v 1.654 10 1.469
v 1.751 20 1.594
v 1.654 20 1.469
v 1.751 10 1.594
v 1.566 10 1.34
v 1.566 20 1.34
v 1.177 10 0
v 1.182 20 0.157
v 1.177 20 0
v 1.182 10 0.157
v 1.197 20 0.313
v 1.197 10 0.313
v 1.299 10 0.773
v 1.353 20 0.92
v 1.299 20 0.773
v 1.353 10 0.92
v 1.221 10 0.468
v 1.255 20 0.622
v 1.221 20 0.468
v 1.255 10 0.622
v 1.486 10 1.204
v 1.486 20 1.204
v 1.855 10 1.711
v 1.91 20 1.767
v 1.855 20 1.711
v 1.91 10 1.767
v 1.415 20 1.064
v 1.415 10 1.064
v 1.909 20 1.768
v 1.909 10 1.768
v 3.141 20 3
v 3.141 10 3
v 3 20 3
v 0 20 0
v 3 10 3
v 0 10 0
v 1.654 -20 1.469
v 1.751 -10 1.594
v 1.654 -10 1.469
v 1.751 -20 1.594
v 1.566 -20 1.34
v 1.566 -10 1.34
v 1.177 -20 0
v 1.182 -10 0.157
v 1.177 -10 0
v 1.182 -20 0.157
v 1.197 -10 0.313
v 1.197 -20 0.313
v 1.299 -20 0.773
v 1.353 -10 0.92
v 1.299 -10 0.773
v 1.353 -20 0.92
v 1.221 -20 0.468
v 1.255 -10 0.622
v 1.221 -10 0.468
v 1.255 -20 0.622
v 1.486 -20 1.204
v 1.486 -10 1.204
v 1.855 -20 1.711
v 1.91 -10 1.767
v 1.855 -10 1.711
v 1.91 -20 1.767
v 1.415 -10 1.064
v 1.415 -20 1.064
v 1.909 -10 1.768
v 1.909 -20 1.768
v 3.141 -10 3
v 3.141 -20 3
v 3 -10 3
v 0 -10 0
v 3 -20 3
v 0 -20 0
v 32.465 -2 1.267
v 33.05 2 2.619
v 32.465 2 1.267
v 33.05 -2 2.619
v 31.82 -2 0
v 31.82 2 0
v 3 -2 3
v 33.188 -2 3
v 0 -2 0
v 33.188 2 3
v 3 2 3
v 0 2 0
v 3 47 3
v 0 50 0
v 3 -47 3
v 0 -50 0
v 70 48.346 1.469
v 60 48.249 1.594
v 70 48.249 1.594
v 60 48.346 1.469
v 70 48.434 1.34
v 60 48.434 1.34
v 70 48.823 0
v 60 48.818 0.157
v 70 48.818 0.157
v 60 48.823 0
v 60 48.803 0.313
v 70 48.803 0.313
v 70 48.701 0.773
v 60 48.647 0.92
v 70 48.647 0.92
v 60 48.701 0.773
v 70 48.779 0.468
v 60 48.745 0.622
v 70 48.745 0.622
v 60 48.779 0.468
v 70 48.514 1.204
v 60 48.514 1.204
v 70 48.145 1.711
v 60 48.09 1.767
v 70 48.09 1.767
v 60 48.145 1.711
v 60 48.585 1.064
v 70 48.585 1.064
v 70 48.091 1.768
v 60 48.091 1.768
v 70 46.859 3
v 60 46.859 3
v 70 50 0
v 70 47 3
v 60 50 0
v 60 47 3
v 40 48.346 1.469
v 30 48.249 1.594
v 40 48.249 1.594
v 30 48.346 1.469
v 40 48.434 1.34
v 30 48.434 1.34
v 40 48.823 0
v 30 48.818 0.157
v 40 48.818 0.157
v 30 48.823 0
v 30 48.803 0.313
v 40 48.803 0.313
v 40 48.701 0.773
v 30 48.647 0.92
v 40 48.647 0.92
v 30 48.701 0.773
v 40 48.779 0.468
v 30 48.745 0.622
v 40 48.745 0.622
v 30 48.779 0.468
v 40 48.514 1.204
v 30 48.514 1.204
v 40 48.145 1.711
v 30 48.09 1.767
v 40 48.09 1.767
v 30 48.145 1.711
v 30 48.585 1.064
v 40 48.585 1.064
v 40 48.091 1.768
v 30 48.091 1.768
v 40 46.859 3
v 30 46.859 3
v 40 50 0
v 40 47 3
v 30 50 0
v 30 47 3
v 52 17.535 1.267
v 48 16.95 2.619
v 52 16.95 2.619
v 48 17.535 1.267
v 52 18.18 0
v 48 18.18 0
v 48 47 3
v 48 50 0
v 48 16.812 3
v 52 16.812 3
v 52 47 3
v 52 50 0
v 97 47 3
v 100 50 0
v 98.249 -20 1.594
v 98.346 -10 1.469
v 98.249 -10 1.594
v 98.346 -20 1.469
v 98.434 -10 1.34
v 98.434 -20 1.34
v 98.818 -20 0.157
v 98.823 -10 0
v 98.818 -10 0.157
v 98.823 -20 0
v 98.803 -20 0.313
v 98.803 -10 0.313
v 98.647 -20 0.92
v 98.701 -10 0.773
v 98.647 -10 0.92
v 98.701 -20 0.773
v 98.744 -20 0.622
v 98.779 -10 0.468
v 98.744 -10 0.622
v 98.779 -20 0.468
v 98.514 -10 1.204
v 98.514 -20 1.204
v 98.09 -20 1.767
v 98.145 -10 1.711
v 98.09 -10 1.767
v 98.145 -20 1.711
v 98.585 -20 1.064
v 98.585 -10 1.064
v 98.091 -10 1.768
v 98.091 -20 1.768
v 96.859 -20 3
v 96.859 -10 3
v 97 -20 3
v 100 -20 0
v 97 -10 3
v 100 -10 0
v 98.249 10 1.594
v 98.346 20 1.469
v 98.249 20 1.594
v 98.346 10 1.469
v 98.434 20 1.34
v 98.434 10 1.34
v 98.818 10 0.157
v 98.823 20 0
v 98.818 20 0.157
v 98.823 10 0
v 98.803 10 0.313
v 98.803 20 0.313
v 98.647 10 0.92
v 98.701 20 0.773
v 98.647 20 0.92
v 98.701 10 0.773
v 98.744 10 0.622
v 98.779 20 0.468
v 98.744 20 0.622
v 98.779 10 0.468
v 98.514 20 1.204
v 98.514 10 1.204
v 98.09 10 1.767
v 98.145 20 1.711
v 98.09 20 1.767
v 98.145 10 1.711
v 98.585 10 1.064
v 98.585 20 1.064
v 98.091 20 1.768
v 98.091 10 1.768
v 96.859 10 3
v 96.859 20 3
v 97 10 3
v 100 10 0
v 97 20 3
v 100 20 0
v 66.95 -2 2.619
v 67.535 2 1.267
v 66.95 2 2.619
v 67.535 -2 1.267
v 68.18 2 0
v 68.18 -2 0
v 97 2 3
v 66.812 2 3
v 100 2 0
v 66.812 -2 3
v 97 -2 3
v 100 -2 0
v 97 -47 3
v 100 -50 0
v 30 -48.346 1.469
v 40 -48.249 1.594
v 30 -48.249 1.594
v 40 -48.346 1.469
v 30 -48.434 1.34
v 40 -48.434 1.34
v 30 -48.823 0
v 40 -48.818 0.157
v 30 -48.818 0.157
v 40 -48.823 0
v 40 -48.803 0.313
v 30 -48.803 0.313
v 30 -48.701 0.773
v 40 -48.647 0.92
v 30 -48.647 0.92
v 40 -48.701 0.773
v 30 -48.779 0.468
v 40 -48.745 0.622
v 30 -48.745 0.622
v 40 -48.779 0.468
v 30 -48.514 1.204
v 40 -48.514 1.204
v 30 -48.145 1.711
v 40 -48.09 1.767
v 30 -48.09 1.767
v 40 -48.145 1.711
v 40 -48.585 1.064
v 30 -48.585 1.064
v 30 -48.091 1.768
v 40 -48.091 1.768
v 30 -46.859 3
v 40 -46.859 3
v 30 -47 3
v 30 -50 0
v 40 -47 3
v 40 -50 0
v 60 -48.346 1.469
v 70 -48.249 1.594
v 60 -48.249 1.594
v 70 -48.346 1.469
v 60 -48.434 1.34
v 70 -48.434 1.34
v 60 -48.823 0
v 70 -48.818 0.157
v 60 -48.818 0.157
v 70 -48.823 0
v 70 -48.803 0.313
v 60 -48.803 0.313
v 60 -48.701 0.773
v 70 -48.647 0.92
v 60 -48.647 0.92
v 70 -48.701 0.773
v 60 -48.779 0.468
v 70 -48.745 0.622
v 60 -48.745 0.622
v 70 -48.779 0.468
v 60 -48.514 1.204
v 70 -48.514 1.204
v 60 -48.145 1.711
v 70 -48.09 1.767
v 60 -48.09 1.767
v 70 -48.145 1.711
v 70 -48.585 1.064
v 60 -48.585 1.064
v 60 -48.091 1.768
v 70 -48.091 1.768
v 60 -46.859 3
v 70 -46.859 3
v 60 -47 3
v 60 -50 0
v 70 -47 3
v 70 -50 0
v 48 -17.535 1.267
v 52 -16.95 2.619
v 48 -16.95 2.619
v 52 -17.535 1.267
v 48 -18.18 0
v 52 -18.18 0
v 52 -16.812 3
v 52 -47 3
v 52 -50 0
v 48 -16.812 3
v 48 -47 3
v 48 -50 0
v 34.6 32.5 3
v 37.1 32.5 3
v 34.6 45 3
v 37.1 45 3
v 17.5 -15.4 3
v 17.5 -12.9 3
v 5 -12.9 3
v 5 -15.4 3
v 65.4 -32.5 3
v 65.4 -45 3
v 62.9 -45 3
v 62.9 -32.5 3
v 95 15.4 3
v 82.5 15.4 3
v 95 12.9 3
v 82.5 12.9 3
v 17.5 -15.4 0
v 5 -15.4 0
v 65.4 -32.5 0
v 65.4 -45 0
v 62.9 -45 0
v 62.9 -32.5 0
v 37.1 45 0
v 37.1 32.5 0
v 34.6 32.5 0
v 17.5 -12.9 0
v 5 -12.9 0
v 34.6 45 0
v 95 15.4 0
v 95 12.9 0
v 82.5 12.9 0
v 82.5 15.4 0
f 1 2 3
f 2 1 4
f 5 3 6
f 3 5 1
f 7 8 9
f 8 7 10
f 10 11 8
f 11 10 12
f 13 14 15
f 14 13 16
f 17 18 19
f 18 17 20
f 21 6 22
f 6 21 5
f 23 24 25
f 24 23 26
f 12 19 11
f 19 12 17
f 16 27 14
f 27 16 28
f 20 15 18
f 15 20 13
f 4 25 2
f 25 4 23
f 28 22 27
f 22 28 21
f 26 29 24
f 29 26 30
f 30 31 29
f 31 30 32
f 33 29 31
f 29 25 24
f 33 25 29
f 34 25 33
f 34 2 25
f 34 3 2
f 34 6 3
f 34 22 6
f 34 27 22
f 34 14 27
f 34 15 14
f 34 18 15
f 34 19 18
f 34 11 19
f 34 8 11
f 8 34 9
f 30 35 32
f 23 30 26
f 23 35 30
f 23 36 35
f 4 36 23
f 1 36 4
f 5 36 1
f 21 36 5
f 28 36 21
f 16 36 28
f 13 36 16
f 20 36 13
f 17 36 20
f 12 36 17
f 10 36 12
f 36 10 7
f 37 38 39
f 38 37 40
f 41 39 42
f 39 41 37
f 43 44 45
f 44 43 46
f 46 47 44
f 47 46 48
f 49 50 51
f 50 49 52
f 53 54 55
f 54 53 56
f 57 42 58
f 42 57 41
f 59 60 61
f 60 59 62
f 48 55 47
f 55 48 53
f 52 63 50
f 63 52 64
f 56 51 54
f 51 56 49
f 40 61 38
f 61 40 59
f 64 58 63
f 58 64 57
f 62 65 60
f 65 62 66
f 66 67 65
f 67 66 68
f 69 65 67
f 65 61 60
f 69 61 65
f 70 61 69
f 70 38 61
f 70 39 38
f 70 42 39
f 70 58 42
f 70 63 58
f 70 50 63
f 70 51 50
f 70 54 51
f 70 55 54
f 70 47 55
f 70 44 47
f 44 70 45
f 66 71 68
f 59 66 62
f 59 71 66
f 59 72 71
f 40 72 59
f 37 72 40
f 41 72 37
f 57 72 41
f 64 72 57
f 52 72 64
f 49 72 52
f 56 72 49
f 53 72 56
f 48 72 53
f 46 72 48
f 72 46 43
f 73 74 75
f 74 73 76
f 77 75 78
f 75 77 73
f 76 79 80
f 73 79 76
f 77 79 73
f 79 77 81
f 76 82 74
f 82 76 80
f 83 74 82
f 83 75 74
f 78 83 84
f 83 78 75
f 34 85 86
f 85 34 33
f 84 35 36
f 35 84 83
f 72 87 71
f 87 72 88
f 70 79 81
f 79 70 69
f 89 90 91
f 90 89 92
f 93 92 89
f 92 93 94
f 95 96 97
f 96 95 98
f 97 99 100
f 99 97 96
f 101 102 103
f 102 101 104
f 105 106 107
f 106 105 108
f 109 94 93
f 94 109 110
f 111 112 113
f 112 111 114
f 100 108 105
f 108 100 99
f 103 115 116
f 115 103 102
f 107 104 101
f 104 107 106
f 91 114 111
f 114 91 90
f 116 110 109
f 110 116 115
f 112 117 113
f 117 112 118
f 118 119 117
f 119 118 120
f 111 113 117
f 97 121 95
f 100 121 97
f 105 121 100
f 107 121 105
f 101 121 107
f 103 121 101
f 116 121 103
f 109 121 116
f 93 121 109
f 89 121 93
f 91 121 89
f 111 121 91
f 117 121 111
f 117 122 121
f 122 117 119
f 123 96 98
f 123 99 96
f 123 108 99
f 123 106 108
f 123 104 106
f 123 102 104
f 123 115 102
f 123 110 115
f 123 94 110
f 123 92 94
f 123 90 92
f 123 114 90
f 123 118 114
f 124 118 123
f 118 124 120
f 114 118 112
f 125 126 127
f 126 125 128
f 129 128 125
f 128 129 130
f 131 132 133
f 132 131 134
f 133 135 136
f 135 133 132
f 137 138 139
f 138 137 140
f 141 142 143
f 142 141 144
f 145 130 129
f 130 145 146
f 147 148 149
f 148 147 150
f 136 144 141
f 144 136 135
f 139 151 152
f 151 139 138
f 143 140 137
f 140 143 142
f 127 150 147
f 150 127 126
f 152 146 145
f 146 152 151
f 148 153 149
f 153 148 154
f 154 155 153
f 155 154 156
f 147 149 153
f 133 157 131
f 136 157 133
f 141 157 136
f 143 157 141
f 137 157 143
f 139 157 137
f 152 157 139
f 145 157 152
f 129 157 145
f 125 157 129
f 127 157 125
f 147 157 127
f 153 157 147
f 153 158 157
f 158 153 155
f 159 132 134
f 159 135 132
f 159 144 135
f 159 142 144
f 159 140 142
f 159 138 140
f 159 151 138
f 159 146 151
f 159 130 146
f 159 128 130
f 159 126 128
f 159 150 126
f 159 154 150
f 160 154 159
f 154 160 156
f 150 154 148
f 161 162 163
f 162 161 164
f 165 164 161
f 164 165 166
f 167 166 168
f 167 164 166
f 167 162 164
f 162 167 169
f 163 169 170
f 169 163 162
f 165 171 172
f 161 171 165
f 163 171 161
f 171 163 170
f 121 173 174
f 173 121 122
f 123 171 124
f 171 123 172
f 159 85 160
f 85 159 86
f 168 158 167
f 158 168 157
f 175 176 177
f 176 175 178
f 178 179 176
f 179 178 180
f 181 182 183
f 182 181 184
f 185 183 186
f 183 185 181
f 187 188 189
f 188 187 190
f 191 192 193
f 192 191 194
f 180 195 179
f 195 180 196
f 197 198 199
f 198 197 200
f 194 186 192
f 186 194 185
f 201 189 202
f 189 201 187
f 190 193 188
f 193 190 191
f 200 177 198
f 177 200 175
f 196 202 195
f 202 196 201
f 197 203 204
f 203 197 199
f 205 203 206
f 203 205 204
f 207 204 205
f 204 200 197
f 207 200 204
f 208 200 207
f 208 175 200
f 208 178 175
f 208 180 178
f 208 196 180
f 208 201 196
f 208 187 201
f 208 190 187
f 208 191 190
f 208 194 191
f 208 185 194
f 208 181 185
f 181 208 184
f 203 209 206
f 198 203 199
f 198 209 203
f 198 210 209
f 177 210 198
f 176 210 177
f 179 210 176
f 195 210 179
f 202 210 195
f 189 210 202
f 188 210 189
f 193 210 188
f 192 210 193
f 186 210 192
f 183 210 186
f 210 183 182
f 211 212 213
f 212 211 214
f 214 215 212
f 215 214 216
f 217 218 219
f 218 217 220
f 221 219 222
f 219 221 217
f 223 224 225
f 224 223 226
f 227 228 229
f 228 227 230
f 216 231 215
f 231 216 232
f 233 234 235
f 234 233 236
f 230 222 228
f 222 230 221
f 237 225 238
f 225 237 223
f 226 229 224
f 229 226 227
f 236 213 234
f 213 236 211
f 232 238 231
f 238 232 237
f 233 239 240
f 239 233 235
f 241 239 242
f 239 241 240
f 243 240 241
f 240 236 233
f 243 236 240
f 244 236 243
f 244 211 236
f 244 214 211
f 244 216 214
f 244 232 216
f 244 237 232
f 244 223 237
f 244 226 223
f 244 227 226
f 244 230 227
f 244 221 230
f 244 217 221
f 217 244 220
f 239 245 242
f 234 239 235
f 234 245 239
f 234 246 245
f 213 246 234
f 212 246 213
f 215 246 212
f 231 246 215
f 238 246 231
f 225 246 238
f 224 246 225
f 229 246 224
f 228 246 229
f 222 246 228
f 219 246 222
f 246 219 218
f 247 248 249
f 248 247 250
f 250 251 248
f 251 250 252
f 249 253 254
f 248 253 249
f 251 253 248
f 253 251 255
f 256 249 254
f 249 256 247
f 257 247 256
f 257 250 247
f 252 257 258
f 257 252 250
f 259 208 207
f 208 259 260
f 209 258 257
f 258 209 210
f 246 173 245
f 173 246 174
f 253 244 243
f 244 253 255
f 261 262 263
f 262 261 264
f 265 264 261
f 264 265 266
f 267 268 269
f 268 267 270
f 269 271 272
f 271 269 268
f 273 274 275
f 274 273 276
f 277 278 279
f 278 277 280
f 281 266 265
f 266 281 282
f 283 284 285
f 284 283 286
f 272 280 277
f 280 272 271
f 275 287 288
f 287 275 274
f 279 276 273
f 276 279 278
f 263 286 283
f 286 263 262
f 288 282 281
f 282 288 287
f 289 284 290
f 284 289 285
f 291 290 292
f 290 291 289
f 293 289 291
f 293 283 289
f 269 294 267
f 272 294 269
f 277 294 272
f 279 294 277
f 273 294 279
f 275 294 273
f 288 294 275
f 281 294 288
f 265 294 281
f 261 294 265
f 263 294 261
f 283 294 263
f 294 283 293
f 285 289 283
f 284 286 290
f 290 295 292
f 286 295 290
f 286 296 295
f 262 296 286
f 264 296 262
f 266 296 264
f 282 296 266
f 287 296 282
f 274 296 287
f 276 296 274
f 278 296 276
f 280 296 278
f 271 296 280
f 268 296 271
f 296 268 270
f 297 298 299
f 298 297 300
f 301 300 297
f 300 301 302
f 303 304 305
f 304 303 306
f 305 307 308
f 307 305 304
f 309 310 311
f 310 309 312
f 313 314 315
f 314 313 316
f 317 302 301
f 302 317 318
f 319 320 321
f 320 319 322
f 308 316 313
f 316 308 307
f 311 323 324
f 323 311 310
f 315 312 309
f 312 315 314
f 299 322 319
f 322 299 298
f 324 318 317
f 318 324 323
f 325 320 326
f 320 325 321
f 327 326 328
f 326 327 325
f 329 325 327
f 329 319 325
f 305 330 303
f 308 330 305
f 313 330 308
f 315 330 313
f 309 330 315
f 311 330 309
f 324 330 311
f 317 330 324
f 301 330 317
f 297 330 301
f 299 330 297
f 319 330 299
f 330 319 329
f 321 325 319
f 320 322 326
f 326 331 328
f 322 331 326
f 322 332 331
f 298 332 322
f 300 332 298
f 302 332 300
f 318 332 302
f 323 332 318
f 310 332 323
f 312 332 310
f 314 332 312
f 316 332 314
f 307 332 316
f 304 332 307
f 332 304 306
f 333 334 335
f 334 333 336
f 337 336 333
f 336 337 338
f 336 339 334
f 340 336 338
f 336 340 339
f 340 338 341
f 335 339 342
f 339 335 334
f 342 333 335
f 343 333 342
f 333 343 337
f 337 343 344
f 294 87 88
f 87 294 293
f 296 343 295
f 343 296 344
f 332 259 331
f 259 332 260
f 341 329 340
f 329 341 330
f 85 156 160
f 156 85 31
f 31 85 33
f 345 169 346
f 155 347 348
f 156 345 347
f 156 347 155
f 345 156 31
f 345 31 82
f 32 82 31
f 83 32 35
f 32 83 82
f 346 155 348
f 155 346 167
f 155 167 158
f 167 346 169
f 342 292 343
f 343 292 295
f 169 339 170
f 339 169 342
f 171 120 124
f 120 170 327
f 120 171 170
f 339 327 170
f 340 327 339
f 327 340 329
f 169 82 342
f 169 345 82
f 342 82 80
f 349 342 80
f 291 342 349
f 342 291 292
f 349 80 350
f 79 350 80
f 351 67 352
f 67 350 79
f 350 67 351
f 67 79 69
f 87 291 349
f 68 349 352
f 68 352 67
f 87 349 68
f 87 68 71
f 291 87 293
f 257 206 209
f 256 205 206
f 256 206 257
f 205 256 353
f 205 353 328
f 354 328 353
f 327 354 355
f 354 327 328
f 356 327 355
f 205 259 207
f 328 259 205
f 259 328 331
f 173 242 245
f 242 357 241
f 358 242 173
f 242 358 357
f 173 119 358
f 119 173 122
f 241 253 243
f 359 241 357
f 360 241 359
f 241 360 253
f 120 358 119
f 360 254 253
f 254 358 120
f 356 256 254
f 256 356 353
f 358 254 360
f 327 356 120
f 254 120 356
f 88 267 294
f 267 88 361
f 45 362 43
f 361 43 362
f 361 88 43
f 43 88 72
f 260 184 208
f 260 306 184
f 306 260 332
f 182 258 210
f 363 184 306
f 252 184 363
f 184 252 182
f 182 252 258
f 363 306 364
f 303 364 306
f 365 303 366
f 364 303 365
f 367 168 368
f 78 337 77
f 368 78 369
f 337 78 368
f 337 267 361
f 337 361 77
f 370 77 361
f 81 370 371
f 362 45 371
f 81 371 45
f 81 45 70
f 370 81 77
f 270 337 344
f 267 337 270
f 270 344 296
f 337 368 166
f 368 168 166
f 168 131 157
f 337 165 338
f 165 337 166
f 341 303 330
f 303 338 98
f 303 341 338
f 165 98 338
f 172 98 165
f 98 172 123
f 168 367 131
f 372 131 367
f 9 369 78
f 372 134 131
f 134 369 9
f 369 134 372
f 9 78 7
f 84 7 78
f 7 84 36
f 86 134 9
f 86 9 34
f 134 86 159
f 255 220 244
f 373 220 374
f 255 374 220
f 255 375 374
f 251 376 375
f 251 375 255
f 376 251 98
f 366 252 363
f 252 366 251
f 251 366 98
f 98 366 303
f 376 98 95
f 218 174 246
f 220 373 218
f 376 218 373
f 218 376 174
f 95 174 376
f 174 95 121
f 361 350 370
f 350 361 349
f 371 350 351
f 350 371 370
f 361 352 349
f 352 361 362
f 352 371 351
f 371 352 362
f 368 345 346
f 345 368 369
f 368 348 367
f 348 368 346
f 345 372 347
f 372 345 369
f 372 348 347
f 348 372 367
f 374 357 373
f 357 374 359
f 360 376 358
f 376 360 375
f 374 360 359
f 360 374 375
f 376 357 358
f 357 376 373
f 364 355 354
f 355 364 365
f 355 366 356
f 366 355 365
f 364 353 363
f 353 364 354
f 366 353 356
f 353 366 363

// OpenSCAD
// file: ../servo.scad
diff = 1;  // For holes.

servo_length = 22.5;
servo_width = 12.3;
servo_height = 23.5;

servo_mountsTop = 19.3;
servo_mountsThickness = 2.3;
servo_mountsOut = 5.1;
servo_mountsHoleWidth = 2.8;
servo_mountsSlotWidth = 1;

servo_gearholderHeight = 4.3;
servo_gearholderRadius = servo_width / 2;
servo_gearholderInset = servo_gearholderRadius;
servo_gearholderSmallRadius = 2.5;
servo_gearholderSmallOffset = servo_gearholderRadius * 2;

servo_hornStubHeight = 3.5;
servo_hornStubRadius = 2.3;

servo_armThickness = 1.4;
servo_armStalkRadius = 3.5;
servo_armStalkHeight = 3.9;
servo_armStalkAboutBase = 0.75;
servo_armHornHoleRadius = 0.4;
servo_armHoleSpacing = 2;
servo_bigArmBigRadius = 3.5;
servo_bigArmBigRadiusOut = 1;
servo_bigArmSmallRadius = 1.8;
servo_bigArmCentersLength = 16.9;
servo_bigArmHornHoleCount = 7;
servo_smallArmBigRadius = 1.8;
servo_smallArmBigRadiusOut = 0;
servo_smallArmSmallRadius = 1.8;
servo_smallArmCentersLength = 6.8;
servo_smallArmHornHoleCount = 2;

servo_wireFromBottom = 1.5;
servo_wireWidth = 3.6;

servo_totalHeight = servo_height + servo_gearholderHeight + servo_armStalkAboutBase + servo_armStalkHeight;

module sg90Servo(rotation) {

    translate([-servo_gearholderRadius, -servo_gearholderRadius, -servo_totalHeight]) {
        color([0, 0, 0.7]) {
            _chassis();
            _clusterProtrusion();
        }

        _wireStub();

        color([1, 1, 1]) {
            _horn();
            translate([servo_width / 2, servo_width / 2, servo_height + servo_gearholderHeight + servo_armStalkAboutBase]) {
                _arm(rotation, true);
            }
        }
    }
}

module _chassis() {
    cube([servo_length, servo_width, servo_height]);

    translate([-servo_mountsOut, 0, servo_mountsTop - servo_mountsThickness]) {
        difference() {
            cube([servo_length + (servo_mountsOut * 2), servo_width, servo_mountsThickness]);

            // Mount hole/slot.
            translate([servo_mountsOut / 2, servo_width / 2, -diff]) {
                cylinder(r=servo_mountsHoleWidth / 2, h=servo_mountsThickness + (diff*2));
            }
            translate([-diff, (servo_width / 2) - (servo_mountsSlotWidth / 2), -diff]) {
                cube([(servo_mountsOut / 2) + diff, servo_mountsSlotWidth, servo_mountsThickness + (diff*2)]);
            }
            translate([servo_length + servo_mountsOut, 0, 0]) {
                translate([servo_mountsOut / 2, servo_width / 2, -diff]) {
                    cylinder(r=servo_mountsHoleWidth / 2, h=servo_mountsThickness + (diff*2));
                }
                translate([(servo_mountsOut / 2), (servo_width / 2) - (servo_mountsSlotWidth / 2), -diff]) {
                    cube([(servo_mountsOut / 2) + diff, servo_mountsSlotWidth, servo_mountsThickness + (diff*2)]);
                }
            }
        }
    }
}

module _wireStub() {
    translate([0, servo_width / 2, servo_wireFromBottom]) {
        rotate([0, -90, 0]) {
            color([1, 0, 0]) cylinder(h=servo_wireWidth / 3, r=servo_wireWidth / 6);
            color([0.5, 0.25, 0.25]) translate([0, -servo_wireWidth / 3, 0]) cylinder(h=servo_wireWidth / 3, r=servo_wireWidth / 6);
            color([1, 1, 0.5]) translate([0, servo_wireWidth / 3, 0]) cylinder(h=servo_wireWidth / 3, r=servo_wireWidth / 6);
        }
    }
}

module _clusterProtrusion() {
    translate([servo_gearholderInset, servo_width / 2, servo_height]) {
        cylinder(h=servo_gearholderHeight, r=servo_gearholderRadius);
    }

    translate([servo_gearholderSmallOffset, servo_width / 2, servo_height]) {
        cylinder(h=servo_gearholderHeight, r=servo_gearholderSmallRadius);
    }
}

module _horn() {
    translate([servo_width / 2, servo_width / 2, servo_height + servo_gearholderHeight]) {
        cylinder(h=servo_hornStubHeight, r=servo_hornStubRadius);
    }
}

module _arm(rotation, holes) {
    cylinder(h=servo_armStalkHeight, r=servo_armStalkRadius);

    difference() {
        hull() {
            translate([0, 0, servo_armStalkHeight - servo_armThickness]) {
                rotate([0, 0, rotation]) {
                    translate([servo_bigArmBigRadiusOut, -servo_bigArmBigRadius, 0]) cube([0.1, servo_bigArmBigRadius*2, servo_armThickness]);
                    translate([servo_bigArmCentersLength, 0, 0]) {
                        cylinder(h=servo_armThickness, r=servo_bigArmSmallRadius);
                    }
                }
            }
        }

        if (holes) {
            for(offset = [0:servo_bigArmHornHoleCount])  {
                translate([0, 0, servo_armStalkHeight - servo_armThickness - 1]) {
                    rotate([0, 0, rotation]) {
                        translate([servo_bigArmCentersLength - (servo_armHoleSpacing * offset), 0, 0]) {
                            cylinder(h=servo_armThickness + 2, r=servo_armHornHoleRadius);
                        }
                    }
                }
            }
        }
    }
    
    rotate([0, 0, 90]) difference() {
        hull() {
            translate([0, 0, servo_armStalkHeight - servo_armThickness]) {
                rotate([0, 0, rotation]) {
                    translate([servo_smallArmBigRadiusOut, -servo_smallArmBigRadius, 0]) cube([0.01, servo_smallArmBigRadius*2, servo_armThickness]);
                    translate([servo_smallArmCentersLength, 0, 0]) {
                        cylinder(h=servo_armThickness, r=servo_smallArmSmallRadius);
                    }
                }
            }
        }

        if (holes) {
            for(offset = [0:servo_smallArmHornHoleCount])  {
                translate([0, 0, servo_armStalkHeight - servo_armThickness - 1]) {
                    rotate([0, 0, rotation]) {
                        translate([servo_smallArmCentersLength - (servo_armHoleSpacing * offset), 0, 0]) {
                            cylinder(h=servo_armThickness + 2, r=servo_armHornHoleRadius);
                        }
                    }
                }
            }
        }
    }       
    
    rotate([0, 0, -90]) difference() {
        hull() {
            translate([0, 0, servo_armStalkHeight - servo_armThickness]) {
                rotate([0, 0, rotation]) {
                    translate([servo_smallArmBigRadiusOut, -servo_smallArmBigRadius, 0]) cube([0.01, servo_smallArmBigRadius*2, servo_armThickness]);
                    translate([servo_smallArmCentersLength, 0, 0]) {
                        cylinder(h=servo_armThickness, r=servo_smallArmSmallRadius);
                    }
                }
            }
        }

        if (holes) {
            for(offset = [0:servo_smallArmHornHoleCount])  {
                translate([0, 0, servo_armStalkHeight - servo_armThickness - 1]) {
                    rotate([0, 0, rotation]) {
                        translate([servo_smallArmCentersLength - (servo_armHoleSpacing * offset), 0, 0]) {
                            cylinder(h=servo_armThickness + 2, r=servo_armHornHoleRadius);
                        }
                    }
                }
            }
        }
    }       
}

//$fn=100;
//sg90Servo(0);
//_arm(45, true);
// file: ../magicbox.scad
include <servo.scad>;

// For making holes.
slot_diff = 1;

// For spacing moving parts.
fit_gaps = 0.1;
motion_gaps = 0.5;

cam_axis_inset_from_wall_outside = servo_mountsOut + servo_gearholderInset;
cam_radius = cam_axis_inset_from_wall_outside;
cam_flat_length = 20;
cam_outer_radius = sqrt(pow(cam_radius, 2) + pow(cam_flat_length, 2));
cam_thickness = 3;

wall_thickness = 3;
box_size = (servo_totalHeight + wall_thickness + (cam_thickness / 2) - servo_armThickness) * 2;

hinge_radius = 2.5;
hinge_gap = 0.2;
hinge_height = 10;
hinge_axis_sep = 10;

module box(cam_angle) {
    color("silver") side_with_servo_rear_mount();
    rotate([0, 0, 90]) color("silver") side_with_servo_mount_slot();

    translate([cam_axis_inset_from_wall_outside, cam_axis_inset_from_wall_outside, -cam_thickness/2 + servo_armThickness]) sg90Servo(cam_angle+45);
    translate([cam_radius, cam_radius, -cam_thickness/2]) color("yellow") rotate([0, 0, 180 + cam_angle]) cam();
}

module side_with_servo_mount_slot() {
    mirror([0, 1, 0]) difference() {
        side();
        translate([box_size/2, 0, 0]) for(index = [0:4])  {
            rotate([0, index*90, 0]) {
                translate([-box_size/2, 0, 0]) translate([cam_axis_inset_from_wall_outside - (servo_width/2) - fit_gaps, -slot_diff, -servo_mountsTop+servo_mountsThickness+servo_armThickness+fit_gaps*2]) {
                    cube([servo_width + fit_gaps*2, wall_thickness + slot_diff*2, servo_mountsThickness + fit_gaps*2]);
                }
            }
        }
    }
}

module side_with_servo_rear_mount() {
    side();
    translate([box_size/2, 0, 0]) for(index = [0:4])  {
        rotate([0, index*90, 0]) {
            translate([-box_size/2, 0, 0]) translate([servo_length + servo_mountsOut + fit_gaps, 0, -servo_totalHeight + servo_mountsTop - cam_thickness/2 + servo_armThickness - servo_mountsThickness - fit_gaps - 10]) {
                 cube([servo_mountsOut, servo_mountsOut+servo_width, 10]);
            }
            translate([-box_size/2, 0, 0]) translate([servo_length + fit_gaps, 0, -servo_totalHeight + servo_mountsTop - cam_thickness/2 + servo_armThickness - servo_mountsThickness - fit_gaps - 10]) {
                 cube([servo_mountsOut, servo_mountsOut - fit_gaps, 10]);
            }
        }
    }
}

module side() {
    height = box_size;
    difference() {
        translate([0, 0, -height/2]) cube([box_size, wall_thickness, height]);
        union() {
            translate([box_size/2, 0, 0]) for(index = [0:4])  {
                rotate([0, index*90, 0]) {
                    translate([-box_size/2, 0, 0]) {                        
                        translate([cam_axis_inset_from_wall_outside, cam_axis_inset_from_wall_outside, -(cam_thickness/2 + motion_gaps)]) {
                            cylinder(r=cam_outer_radius + motion_gaps, h=cam_thickness + (motion_gaps*2));
                        }
                        translate([0, 0, hinge_axis_sep]) hinge_slot();
                        translate([0, 0, -hinge_axis_sep-hinge_height]) hinge_slot();
                        translate([0, 0, -height/2 - slot_diff]) rotate([0, 0, 45]) translate([-slot_diff, 0, 0]) cube([pow(wall_thickness,2), pow(wall_thickness,2), height + slot_diff*2]);
                    }
                }
            }
        }
    }
}

module hinge_slot() {
    inset = sqrt(2 * pow(hinge_radius + hinge_gap/2, 2));
    difference(){
        translate([-slot_diff, -slot_diff, 0]) cube([inset+slot_diff, inset+slot_diff, hinge_height]);
        union() {
            translate([inset, 0, -slot_diff]) {
                cylinder(r=hinge_radius, h=hinge_height + slot_diff*2);
                rotate([0, 0, 45]) translate([0, -hinge_radius, 0]) cube([hinge_radius*2, hinge_radius*2, hinge_height + slot_diff*2]);
            }
        }
    }
}

module cam() {
    rotate([0, 0, -90]) {
        difference() {
            hull() {
                cylinder(r=cam_radius, h=cam_thickness);
                difference() {   
                    cylinder(r=cam_outer_radius, h=cam_thickness);
                    union() {
                        rotate([0, 0, 90]) translate([0, -cam_flat_length, -slot_diff]) cube([cam_outer_radius * 2, cam_outer_radius * 2, cam_thickness * 2]);
                        rotate([0, 0, 90]) mirror([1, -1, 0]) translate([0, -cam_flat_length, -slot_diff]) cube([cam_outer_radius * 2, cam_outer_radius * 2, cam_thickness * 2]);
                    }
                }
            }
            translate([0, 0, - servo_armStalkHeight + servo_armThickness - 0.5]) {
                scale([1.02, 1.02, 1.02]) _arm(-45, false);
            }
        }
    }
}

function separation_angle(d, r, c) =
    d < acos(r/c) ?
        -2 * atan((c * sin(90 - acos(r/c) + d) - r) / (r + sqrt(pow(c,2)- pow(c * sin(90 - acos(r/c) + d), 2))))
        :
        -2 * atan((c * sin(90 - acos(r/c) + d) - r) / (r - sqrt(pow(c,2)- pow(c * sin(90 - acos(r/c) + d), 2))));

module hinge_pair(cam_rotation) {
    box_angle = separation_angle(cam_rotation, cam_radius, cam_outer_radius);
    box(cam_rotation);
    rotate([0, 180, -box_angle]) box(cam_rotation);
}

//$fn=100;
//cam();
//box(0);
//side();
//hinge_pair(15);
//side_with_servo_mount_slot();
// main file
include <../magicbox.scad>; 
$fn = 100; box_size = 100; rotate([-90, 0, 0]) side_with_servo_mount_slot();; 
